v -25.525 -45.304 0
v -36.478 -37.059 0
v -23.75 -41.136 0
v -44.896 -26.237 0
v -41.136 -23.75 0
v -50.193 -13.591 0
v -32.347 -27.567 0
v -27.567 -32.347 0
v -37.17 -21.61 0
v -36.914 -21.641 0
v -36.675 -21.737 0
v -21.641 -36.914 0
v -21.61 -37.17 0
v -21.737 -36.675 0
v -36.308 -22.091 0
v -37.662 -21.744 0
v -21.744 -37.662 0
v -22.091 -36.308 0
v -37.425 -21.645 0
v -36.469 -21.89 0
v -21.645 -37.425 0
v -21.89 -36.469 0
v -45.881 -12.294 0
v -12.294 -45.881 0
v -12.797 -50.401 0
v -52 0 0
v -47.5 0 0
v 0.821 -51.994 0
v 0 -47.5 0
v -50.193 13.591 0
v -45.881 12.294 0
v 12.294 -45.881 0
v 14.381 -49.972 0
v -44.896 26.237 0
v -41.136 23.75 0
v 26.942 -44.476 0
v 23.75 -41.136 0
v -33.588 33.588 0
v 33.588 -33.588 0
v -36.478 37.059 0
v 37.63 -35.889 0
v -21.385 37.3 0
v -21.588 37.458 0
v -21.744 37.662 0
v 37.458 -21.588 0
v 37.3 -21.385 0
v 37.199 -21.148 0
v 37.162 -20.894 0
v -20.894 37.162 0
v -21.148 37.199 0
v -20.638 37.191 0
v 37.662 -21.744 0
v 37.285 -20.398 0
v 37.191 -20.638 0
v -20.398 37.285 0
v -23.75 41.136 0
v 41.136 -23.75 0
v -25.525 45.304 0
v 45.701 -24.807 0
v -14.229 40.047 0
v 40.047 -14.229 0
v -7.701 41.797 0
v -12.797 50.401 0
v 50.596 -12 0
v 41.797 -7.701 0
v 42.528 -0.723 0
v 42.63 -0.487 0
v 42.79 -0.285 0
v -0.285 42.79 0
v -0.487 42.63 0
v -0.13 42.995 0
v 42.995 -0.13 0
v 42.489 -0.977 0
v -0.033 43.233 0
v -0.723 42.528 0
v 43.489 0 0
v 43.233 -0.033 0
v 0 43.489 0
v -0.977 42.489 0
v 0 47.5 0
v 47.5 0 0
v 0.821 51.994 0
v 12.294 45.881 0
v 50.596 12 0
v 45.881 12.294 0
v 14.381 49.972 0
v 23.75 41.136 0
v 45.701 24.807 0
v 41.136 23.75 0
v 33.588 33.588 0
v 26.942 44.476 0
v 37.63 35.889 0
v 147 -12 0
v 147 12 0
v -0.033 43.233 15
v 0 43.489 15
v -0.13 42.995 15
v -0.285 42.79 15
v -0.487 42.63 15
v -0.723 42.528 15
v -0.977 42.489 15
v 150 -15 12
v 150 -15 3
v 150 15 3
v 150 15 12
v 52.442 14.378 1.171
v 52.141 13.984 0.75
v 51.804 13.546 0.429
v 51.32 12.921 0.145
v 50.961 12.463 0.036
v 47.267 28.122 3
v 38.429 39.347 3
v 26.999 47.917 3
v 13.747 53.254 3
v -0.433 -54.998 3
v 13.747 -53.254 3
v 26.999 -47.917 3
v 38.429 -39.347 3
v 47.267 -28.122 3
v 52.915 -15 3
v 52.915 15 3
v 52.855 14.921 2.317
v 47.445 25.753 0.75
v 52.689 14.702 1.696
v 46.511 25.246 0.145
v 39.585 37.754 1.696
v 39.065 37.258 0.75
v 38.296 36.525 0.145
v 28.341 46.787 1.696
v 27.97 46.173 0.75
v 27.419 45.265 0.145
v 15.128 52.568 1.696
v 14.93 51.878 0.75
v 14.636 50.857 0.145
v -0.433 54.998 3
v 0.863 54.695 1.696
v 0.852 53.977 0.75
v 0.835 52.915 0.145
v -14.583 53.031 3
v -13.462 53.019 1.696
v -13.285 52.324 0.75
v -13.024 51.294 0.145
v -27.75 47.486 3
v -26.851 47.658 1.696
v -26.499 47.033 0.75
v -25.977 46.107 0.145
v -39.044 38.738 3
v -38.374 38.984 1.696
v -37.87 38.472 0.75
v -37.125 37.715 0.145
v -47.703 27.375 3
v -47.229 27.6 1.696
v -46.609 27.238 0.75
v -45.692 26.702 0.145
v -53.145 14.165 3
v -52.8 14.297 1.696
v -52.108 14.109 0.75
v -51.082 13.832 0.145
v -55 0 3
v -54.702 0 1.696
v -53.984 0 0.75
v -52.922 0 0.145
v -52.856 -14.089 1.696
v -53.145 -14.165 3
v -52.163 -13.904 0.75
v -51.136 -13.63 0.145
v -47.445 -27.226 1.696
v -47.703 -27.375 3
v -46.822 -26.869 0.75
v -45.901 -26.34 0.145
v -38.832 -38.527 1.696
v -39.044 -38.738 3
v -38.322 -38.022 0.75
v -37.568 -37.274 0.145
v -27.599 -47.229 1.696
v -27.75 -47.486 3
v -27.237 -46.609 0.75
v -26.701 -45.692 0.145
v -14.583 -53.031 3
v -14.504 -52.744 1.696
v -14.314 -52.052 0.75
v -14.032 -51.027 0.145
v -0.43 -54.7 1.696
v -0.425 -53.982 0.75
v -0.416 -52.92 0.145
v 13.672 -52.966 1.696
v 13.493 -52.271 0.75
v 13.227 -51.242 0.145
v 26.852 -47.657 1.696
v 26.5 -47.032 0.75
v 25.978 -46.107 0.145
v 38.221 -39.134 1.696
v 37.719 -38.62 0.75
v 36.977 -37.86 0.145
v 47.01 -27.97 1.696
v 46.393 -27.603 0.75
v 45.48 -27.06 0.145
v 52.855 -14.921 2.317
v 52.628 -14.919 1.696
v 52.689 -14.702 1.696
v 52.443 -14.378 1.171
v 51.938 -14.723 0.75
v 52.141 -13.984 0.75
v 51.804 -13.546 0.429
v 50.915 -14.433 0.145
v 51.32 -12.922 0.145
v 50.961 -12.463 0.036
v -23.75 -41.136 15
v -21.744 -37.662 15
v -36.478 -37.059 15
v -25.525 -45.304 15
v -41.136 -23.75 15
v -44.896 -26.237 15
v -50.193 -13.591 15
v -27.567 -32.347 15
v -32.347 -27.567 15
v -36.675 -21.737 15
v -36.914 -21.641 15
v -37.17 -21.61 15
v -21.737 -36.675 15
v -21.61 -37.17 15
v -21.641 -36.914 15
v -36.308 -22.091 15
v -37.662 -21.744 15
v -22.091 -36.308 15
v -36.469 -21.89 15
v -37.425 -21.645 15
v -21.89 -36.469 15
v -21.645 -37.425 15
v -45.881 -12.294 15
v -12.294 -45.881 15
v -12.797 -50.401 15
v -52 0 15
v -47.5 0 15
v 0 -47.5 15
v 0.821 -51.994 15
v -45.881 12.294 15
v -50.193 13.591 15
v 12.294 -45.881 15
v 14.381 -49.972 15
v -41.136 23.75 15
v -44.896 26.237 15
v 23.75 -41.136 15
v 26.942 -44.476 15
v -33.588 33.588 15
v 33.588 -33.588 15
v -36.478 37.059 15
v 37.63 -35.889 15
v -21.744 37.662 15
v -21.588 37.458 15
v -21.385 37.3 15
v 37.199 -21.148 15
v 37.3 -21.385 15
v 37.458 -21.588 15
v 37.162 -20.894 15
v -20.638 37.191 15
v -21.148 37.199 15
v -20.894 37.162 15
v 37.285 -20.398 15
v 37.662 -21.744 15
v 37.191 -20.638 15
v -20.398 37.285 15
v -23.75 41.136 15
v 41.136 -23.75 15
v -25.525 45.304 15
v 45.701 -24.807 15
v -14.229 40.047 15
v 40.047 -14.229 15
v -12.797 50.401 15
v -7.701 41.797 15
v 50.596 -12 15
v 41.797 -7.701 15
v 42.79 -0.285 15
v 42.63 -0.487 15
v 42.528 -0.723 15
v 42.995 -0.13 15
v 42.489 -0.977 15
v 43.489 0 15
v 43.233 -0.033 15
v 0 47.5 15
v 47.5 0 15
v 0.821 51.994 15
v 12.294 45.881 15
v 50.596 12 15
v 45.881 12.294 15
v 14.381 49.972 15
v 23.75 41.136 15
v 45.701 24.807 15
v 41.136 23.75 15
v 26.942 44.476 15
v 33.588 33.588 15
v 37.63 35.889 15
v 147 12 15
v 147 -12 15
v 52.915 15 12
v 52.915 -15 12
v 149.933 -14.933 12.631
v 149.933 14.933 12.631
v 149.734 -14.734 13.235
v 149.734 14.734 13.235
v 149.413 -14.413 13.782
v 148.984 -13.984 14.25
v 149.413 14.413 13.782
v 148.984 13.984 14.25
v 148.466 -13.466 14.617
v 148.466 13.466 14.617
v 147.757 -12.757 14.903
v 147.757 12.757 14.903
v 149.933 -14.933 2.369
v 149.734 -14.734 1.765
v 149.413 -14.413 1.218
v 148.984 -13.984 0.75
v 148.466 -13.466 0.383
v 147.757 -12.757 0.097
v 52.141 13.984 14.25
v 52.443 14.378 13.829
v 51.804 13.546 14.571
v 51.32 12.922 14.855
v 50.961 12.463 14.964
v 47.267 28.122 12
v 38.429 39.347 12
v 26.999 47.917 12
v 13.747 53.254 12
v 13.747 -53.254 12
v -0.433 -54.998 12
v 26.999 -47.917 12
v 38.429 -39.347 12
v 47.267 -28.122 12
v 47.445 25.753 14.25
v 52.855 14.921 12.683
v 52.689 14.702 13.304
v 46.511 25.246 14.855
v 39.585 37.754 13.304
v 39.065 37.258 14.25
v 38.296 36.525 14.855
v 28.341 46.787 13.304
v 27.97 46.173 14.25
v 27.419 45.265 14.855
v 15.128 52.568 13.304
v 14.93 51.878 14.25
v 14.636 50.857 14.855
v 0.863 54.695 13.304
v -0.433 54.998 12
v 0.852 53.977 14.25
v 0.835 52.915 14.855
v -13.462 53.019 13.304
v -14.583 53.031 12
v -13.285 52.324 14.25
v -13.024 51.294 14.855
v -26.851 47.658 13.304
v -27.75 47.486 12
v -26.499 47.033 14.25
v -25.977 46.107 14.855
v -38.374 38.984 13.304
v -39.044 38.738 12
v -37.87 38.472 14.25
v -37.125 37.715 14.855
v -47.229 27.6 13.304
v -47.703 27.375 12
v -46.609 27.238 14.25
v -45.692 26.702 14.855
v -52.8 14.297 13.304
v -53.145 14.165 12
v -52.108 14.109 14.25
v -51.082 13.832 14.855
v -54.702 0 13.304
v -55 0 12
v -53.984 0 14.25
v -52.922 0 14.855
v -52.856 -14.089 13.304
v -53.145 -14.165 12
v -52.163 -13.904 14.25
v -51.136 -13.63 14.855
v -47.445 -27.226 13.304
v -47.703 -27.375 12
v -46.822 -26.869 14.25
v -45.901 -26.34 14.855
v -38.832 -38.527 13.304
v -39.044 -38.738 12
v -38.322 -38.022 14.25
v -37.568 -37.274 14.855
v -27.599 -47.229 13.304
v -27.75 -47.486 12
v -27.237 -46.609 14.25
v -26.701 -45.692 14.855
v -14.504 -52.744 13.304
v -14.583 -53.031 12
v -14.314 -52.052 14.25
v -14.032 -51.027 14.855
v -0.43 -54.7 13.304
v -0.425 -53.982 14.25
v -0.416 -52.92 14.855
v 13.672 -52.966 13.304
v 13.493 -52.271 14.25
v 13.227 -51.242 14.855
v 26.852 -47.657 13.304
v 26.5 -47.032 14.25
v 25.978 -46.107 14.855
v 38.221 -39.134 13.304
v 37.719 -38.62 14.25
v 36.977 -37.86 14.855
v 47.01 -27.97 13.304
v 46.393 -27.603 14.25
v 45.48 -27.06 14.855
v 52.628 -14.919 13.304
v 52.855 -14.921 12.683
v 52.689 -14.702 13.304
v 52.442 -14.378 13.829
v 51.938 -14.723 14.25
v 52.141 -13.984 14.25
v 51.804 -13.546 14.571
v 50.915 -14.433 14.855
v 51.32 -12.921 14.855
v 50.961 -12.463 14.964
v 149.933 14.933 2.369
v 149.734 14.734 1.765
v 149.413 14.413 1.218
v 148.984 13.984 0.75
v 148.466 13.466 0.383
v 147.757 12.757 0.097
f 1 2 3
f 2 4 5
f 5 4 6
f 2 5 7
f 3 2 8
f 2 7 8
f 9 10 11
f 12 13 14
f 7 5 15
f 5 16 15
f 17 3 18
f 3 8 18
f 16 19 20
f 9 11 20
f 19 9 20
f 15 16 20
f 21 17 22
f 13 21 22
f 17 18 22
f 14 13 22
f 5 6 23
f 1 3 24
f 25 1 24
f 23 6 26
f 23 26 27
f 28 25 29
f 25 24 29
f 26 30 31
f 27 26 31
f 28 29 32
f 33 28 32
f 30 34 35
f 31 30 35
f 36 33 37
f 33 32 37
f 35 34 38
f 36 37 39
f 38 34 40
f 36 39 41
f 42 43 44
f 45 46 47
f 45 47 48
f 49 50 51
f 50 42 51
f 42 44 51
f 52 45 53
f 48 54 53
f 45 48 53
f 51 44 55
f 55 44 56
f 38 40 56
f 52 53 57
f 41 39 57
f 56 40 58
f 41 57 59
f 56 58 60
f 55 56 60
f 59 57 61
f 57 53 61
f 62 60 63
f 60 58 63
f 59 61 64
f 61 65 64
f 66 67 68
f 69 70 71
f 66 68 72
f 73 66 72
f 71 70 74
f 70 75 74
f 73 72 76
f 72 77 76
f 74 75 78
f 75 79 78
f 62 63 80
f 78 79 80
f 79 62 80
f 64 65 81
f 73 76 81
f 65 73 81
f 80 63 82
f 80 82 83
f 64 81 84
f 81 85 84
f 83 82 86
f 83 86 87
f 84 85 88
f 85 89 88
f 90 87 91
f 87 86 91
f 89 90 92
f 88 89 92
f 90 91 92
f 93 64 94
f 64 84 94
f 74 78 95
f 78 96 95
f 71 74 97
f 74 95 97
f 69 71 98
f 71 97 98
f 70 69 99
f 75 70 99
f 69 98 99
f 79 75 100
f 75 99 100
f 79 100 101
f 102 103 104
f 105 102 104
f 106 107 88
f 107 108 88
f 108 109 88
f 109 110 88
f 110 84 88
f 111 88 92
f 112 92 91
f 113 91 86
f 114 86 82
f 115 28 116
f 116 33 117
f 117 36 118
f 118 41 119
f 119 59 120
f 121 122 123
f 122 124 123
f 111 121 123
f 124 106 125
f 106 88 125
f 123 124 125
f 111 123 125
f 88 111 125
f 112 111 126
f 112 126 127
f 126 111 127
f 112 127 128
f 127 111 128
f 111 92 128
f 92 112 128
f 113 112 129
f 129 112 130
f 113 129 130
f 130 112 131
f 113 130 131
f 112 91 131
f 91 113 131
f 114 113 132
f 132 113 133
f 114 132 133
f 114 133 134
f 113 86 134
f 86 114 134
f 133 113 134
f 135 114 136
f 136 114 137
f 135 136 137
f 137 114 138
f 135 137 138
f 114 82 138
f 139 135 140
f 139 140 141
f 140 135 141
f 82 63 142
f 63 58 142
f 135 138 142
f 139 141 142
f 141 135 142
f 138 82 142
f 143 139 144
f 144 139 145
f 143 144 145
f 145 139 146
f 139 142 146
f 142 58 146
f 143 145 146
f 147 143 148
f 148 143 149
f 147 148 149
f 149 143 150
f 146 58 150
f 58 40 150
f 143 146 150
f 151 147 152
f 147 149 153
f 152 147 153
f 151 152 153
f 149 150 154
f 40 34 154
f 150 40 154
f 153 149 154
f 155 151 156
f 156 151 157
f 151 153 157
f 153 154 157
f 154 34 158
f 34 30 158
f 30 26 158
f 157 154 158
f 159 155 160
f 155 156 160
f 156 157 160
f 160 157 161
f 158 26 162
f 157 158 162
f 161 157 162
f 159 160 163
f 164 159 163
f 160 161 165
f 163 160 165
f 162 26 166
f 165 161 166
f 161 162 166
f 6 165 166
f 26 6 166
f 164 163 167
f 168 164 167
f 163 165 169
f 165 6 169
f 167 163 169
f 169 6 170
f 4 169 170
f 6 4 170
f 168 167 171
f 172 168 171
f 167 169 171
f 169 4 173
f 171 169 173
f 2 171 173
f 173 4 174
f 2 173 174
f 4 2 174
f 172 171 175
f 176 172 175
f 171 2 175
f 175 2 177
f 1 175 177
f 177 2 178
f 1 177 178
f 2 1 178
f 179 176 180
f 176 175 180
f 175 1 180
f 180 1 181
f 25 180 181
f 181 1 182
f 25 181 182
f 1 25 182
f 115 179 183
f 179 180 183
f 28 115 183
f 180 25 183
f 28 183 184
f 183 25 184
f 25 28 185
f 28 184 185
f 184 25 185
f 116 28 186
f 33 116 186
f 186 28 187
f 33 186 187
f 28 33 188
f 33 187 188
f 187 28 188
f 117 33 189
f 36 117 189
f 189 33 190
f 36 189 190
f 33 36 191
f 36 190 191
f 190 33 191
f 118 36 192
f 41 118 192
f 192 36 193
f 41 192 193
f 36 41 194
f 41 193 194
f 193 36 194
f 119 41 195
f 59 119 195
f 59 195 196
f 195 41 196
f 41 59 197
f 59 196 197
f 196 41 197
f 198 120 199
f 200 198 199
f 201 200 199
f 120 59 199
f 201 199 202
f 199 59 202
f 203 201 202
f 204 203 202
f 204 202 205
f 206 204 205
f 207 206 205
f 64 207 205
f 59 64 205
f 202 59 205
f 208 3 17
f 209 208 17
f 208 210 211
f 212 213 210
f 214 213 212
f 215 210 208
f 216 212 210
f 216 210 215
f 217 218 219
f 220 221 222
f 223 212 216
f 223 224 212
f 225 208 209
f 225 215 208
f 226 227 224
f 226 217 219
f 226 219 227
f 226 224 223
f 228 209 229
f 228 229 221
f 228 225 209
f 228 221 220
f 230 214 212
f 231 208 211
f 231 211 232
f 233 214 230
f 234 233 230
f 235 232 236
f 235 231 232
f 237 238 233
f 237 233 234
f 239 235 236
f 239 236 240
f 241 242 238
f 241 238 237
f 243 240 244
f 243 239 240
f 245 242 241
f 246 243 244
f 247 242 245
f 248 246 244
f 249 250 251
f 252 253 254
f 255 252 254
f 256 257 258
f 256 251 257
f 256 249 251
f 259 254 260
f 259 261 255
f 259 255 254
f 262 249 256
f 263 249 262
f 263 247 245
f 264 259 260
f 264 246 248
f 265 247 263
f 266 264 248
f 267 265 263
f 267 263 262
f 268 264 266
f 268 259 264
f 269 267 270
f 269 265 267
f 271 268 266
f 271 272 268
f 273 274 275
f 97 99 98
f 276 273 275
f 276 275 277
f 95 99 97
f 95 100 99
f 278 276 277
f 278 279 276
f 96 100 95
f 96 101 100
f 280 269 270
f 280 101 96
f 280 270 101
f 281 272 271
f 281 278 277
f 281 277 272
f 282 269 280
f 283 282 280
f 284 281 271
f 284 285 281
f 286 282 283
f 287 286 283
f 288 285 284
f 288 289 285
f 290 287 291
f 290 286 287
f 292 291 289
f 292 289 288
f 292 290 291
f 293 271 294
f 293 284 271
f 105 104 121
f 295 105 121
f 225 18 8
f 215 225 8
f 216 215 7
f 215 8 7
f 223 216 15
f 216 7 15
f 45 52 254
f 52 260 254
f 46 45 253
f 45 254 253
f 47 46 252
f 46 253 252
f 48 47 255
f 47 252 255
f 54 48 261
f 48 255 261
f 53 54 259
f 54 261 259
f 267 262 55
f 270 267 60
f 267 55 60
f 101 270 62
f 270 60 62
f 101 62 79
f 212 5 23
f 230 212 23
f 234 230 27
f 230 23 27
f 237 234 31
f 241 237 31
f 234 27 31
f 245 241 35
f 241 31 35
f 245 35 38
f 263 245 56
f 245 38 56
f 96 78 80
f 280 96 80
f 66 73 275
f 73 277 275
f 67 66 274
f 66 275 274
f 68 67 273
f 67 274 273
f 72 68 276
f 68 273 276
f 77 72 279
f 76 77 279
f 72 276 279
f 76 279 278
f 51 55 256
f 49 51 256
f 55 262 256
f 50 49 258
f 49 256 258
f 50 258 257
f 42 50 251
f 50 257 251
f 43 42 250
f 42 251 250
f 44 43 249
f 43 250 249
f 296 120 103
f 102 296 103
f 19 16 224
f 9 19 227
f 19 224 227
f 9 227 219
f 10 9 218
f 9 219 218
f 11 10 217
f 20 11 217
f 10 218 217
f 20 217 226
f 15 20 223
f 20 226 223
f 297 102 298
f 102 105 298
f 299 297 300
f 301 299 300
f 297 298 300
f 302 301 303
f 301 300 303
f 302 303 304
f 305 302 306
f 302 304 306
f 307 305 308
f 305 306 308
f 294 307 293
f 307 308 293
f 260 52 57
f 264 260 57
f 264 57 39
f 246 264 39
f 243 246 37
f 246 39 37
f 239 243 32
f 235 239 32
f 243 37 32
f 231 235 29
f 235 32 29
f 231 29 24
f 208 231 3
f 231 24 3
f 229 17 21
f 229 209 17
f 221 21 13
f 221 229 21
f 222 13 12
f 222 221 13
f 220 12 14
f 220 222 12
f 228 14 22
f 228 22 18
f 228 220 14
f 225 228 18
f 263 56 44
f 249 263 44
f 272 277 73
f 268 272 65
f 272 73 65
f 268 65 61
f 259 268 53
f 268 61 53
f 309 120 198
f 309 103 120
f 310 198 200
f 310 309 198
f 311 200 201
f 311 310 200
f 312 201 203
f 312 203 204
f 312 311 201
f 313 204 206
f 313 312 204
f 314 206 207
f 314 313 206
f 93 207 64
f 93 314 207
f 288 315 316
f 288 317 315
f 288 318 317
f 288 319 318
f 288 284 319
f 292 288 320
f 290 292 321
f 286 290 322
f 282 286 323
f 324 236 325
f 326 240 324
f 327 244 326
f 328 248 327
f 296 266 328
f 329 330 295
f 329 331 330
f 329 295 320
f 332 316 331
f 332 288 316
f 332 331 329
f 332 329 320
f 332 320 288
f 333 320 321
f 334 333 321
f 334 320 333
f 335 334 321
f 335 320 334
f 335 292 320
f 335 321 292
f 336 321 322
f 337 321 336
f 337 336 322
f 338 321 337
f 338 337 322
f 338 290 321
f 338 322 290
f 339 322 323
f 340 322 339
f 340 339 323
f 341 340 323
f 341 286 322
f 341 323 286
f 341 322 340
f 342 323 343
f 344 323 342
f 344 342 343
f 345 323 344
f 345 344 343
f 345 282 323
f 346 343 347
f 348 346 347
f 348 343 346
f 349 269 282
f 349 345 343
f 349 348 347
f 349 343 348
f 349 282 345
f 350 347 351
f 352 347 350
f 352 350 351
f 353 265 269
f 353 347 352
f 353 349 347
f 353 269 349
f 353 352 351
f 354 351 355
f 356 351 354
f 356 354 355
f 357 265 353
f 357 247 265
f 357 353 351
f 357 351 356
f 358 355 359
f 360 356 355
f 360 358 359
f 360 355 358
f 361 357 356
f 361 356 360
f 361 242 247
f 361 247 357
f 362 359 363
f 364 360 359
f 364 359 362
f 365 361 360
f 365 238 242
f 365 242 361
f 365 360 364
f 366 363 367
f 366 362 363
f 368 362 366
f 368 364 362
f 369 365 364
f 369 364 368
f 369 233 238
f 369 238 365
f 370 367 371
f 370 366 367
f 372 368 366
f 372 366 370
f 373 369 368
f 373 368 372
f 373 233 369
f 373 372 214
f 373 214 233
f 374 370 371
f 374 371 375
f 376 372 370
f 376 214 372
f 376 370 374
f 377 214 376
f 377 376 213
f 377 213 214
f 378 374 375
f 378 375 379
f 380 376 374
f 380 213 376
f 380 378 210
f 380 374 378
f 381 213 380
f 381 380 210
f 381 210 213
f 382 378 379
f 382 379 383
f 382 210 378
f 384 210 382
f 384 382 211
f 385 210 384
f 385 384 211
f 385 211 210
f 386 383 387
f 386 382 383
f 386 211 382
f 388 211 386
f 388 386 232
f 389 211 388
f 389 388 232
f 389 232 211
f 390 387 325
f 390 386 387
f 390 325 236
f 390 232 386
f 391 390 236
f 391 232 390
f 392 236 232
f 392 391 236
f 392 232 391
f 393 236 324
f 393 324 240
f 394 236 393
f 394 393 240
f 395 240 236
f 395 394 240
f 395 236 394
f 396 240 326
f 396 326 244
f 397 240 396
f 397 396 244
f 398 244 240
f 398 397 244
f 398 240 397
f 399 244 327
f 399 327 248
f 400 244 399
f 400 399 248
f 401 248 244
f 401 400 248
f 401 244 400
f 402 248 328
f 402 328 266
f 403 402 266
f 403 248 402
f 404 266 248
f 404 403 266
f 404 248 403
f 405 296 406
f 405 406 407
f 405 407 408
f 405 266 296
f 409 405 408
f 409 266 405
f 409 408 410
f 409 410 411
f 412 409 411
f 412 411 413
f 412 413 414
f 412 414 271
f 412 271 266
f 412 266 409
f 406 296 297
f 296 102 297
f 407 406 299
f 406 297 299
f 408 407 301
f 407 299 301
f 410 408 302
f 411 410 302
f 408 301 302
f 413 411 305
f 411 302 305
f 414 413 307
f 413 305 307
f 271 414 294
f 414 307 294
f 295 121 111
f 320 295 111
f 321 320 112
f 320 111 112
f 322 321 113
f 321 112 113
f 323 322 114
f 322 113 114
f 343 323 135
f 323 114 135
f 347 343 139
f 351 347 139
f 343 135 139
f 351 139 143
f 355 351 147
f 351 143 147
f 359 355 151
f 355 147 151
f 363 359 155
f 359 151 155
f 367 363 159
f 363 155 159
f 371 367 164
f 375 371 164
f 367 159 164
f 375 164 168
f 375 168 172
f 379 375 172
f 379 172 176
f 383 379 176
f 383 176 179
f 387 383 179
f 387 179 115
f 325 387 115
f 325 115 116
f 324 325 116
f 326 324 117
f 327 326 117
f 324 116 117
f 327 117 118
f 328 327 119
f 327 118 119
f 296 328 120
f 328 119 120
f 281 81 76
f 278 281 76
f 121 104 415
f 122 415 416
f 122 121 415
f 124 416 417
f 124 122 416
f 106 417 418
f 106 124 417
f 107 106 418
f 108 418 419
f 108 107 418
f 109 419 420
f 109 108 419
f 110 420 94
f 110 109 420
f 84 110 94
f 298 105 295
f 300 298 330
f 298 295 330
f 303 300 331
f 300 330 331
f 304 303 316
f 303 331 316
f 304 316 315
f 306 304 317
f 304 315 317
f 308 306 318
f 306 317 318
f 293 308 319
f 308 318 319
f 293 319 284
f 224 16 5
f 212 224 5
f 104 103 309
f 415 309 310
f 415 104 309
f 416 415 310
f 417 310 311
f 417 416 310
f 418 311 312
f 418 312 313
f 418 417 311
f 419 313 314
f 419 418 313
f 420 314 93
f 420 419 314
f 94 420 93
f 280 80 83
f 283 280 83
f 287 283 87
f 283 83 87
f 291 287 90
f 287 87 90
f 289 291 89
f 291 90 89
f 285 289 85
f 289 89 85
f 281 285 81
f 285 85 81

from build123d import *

# Parameters (mm, degrees)
F1_DEPTH = 15
F2_R     = 3
F3_R     = 1


with BuildPart() as f1:
    # F0 (on Top) → F1 (new body)
    with BuildSketch(Plane.XY):
        with BuildLine():
            Line((150, 15), (52.915026, 15))
            ThreePointArc((52.915026, 15), (-55, 0), (52.915026, -15))
            Line((52.915026, -15), (150, -15))
            Line((150, -15), (150, 15))
        make_face()
        with BuildLine():
            ThreePointArc((-21.25, -36.80608), (-30.052038, -30.052038), (-36.80608, -21.25))
            Line((-36.80608, -21.25), (-41.136207, -23.75))
            ThreePointArc((-41.136207, -23.75), (-45.881477, 12.293905), (-23.75, 41.136207))
            Line((-23.75, 41.136207), (-21.25, 36.80608))
            ThreePointArc((-21.25, 36.80608), (-10.999809, 41.051848), (0, 42.5))
            Line((0, 42.5), (0, 47.5))
            ThreePointArc((0, 47.5), (33.587572, 33.587572), (47.5, 0))
            Line((47.5, 0), (42.5, 0))
            ThreePointArc((42.5, 0), (41.051848, -10.999809), (36.80608, -21.25))
            Line((36.80608, -21.25), (41.136207, -23.75))
            ThreePointArc((41.136207, -23.75), (12.293905, -45.881477), (-23.75, -41.136207))
            Line((-23.75, -41.136207), (-21.25, -36.80608))
        make_face(mode=Mode.SUBTRACT)
    extrude(amount=F1_DEPTH)

    # F2
    f2_edges = [f1.edges().sort_by_distance(p)[0] for p in [
        (101.457513, 15, 15),
        (150, 0, 15),
        (101.457513, -15, 15),
        (-55, 0, 15),
        (101.457513, -15, 0),
        (150, 0, 0),
        (-55, 0, 0),
        (101.457513, 15, 0),
    ]]
    fillet(f2_edges, radius=F2_R)

    # F3
    f3_edges = [f1.edges().sort_by_distance(p)[0] for p in [
        (36.80608, -21.25, 7.5),
        (42.5, 0, 7.5),
        (0, 42.5, 7.5),
        (-21.25, 36.80608, 7.5),
        (-21.25, -36.80608, 7.5),
        (-36.80608, -21.25, 7.5),
    ]]
    fillet(f3_edges, radius=F3_R)


solid = f1.part
